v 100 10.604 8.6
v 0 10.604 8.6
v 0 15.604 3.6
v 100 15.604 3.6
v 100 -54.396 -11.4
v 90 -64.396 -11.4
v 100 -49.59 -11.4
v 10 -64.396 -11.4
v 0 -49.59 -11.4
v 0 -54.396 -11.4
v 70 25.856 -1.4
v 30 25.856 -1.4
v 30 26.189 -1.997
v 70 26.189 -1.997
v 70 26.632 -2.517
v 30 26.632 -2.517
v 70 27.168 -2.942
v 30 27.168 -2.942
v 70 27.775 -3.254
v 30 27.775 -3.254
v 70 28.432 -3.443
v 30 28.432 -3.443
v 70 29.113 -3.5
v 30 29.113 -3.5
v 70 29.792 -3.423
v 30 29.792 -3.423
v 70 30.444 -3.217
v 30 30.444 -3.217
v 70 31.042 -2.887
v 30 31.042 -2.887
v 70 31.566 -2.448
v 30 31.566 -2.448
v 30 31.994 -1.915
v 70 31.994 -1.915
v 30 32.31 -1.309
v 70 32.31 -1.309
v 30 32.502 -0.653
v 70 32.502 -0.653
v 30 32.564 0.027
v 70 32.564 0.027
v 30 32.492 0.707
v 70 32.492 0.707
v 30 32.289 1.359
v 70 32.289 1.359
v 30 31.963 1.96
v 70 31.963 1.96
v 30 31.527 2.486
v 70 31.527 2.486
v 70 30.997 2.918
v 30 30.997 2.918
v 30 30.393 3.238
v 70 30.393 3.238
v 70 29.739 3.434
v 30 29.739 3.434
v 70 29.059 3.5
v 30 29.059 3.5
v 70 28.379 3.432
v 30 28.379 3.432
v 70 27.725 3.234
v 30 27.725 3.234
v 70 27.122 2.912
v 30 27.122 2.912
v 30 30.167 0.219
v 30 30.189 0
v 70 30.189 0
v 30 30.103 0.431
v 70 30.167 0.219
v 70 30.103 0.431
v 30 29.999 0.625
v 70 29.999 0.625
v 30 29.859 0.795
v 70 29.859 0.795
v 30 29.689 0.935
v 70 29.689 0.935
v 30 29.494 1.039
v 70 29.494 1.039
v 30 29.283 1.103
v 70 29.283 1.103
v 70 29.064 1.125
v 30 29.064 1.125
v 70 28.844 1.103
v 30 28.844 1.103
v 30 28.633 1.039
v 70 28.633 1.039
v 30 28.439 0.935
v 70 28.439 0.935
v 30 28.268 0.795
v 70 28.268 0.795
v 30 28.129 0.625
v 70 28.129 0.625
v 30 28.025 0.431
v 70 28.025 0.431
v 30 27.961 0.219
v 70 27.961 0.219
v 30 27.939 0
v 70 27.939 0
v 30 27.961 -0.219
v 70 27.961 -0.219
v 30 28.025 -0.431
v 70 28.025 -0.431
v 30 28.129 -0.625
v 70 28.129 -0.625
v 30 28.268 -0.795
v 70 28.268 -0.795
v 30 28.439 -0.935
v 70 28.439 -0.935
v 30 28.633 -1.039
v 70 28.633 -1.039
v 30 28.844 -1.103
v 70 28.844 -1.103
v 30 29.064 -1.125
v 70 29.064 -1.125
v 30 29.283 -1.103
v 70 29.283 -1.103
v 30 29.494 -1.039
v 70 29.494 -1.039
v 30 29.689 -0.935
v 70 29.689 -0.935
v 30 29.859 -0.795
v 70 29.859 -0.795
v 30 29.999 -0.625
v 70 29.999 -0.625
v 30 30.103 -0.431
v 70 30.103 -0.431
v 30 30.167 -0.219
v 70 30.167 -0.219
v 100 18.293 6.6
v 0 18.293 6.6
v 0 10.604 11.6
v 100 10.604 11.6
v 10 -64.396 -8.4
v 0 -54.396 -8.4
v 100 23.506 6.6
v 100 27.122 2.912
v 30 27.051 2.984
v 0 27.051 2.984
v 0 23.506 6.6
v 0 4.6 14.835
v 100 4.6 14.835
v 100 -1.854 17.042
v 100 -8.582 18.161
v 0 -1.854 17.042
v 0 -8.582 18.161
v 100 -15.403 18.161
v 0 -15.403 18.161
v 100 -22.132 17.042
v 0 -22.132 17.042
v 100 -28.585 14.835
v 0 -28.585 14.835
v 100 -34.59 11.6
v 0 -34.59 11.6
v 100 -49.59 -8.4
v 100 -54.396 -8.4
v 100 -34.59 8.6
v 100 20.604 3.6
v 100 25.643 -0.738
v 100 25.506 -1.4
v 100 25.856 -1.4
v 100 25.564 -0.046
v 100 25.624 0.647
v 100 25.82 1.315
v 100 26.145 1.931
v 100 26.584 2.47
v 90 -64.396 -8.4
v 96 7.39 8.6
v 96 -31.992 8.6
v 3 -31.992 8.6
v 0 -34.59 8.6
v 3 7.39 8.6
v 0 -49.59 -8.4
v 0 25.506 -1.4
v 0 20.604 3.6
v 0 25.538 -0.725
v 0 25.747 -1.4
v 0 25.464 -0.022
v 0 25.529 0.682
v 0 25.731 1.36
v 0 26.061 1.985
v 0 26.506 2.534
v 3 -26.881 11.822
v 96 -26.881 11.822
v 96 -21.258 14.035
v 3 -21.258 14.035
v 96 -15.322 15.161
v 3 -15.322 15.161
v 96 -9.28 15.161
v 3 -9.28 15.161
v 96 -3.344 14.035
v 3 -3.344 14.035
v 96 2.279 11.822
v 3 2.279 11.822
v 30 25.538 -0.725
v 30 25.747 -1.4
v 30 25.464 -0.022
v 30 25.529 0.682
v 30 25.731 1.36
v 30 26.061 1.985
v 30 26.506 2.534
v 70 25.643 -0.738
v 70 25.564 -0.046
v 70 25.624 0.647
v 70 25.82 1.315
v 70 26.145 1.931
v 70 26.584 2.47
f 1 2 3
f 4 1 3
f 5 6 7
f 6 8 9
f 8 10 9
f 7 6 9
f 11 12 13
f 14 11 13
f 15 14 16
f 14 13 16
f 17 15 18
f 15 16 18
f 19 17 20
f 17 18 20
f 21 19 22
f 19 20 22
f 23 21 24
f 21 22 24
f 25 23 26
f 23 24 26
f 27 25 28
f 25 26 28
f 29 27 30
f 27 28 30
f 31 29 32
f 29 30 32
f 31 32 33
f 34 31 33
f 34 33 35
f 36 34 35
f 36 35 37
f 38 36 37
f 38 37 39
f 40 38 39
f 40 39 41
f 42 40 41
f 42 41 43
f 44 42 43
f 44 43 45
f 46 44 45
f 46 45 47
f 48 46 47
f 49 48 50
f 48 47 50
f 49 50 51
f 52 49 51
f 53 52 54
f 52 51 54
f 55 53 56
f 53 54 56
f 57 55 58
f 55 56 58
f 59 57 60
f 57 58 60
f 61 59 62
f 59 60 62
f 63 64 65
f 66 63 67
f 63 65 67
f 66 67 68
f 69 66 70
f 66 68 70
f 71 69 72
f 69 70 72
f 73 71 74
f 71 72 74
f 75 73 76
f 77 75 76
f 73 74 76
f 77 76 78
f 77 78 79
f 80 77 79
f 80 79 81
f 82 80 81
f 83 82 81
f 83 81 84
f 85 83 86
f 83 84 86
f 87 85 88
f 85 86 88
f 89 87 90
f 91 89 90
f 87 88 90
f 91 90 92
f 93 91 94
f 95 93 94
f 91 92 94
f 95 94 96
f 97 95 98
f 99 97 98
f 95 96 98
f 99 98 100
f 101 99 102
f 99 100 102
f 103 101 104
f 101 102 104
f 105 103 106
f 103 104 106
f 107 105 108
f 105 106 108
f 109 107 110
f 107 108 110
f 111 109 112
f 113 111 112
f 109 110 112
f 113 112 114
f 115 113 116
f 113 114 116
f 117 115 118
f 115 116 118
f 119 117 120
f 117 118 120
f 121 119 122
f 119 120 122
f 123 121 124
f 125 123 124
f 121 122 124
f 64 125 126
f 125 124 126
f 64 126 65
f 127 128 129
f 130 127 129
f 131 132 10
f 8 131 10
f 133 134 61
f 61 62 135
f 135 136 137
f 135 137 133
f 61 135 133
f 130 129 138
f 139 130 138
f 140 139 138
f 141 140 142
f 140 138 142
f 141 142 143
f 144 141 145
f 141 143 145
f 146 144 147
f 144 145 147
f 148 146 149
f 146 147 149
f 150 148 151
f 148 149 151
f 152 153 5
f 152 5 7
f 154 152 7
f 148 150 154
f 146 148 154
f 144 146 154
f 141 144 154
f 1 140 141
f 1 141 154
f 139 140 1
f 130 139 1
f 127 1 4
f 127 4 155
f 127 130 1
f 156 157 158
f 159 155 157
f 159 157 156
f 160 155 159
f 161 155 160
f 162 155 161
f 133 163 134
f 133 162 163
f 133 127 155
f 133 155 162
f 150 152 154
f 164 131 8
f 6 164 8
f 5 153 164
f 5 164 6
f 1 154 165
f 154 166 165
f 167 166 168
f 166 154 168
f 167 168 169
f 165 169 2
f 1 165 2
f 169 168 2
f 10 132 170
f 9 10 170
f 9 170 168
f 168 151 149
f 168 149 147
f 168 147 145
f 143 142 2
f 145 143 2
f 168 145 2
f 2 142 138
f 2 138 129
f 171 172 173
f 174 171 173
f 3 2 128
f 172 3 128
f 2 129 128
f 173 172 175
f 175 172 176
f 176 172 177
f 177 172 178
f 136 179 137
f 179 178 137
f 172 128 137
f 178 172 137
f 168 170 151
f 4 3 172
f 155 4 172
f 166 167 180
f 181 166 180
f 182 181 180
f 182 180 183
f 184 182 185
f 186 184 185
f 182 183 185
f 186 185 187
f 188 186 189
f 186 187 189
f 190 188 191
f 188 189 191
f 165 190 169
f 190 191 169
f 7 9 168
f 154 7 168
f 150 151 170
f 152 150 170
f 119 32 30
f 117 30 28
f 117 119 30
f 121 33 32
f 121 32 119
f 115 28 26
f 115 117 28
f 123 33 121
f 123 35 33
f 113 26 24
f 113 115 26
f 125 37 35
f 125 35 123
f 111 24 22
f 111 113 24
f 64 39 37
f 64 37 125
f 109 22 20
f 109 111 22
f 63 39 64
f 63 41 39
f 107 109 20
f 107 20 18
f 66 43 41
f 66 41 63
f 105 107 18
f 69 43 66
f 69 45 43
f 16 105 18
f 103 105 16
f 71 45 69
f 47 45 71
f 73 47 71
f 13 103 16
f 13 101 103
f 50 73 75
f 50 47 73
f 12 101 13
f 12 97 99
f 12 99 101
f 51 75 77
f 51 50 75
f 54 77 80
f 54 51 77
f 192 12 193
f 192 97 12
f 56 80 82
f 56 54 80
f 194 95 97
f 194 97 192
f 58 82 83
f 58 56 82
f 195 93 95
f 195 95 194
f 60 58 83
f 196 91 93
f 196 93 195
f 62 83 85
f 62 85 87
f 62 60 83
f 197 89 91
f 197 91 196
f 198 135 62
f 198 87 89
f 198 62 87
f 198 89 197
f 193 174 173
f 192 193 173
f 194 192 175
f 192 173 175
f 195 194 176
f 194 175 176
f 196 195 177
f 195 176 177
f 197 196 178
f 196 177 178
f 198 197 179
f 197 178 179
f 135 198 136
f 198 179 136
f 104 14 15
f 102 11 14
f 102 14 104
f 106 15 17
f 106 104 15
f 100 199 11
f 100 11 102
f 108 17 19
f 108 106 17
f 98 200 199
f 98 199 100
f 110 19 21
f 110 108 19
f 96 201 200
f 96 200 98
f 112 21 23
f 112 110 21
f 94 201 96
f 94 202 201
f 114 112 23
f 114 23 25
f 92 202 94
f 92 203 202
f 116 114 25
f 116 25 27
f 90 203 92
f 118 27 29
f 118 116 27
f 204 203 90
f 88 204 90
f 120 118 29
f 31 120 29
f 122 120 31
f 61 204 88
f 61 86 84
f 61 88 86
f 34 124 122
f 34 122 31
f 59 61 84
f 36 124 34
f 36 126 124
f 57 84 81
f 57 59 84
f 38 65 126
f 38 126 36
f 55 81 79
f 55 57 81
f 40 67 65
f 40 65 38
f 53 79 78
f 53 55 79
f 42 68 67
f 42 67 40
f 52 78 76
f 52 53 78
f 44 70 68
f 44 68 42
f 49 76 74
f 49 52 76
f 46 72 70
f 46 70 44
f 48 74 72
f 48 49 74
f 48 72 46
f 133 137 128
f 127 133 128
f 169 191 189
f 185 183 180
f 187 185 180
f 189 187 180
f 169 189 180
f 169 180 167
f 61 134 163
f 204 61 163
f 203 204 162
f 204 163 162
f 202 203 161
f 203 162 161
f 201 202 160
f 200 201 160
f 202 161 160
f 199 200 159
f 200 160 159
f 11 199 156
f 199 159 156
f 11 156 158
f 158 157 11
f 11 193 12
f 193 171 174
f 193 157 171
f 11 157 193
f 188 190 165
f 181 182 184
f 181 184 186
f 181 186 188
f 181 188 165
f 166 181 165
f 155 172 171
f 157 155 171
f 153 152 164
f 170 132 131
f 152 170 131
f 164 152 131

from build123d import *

# Parameters (mm, degrees)
F1_DEPTH  = 100
F2_SIZE   = 10
F3_R      = 3.5
F4_DEPTH  = 30
F5_R      = 3.6
F6_DEPTH  = 30
F7_R      = 1.125
F8_DEPTH  = 40
F11_DEPTH = 93


# Not quite as in the source:
# - a feature names something its author has since deleted; it is built from what else it names


with BuildPart() as f1:
    # F0 (on Right) → F1 (new body)
    with BuildSketch(Plane.YZ):
        with BuildLine():
            Line((25.5061486276, -1.4), (25.8561486276, -1.4))
            ThreePointArc((25.8561486276, -1.4), (32.4222243139, -0.9859028724), (27.1219938253, 2.9118378984))
            Line((27.1219938253, 2.9118378984), (23.5061486276, 6.6))
            Line((23.5061486276, 6.6), (18.2925903906, 6.6))
            Line((18.2925903906, 6.6), (10.6041878433, 11.6))
            Line((10.6041878433, 11.6), (-34.5898121567, 11.6))
            Line((-34.5898121567, 11.6), (-49.5898121567, -8.4))
            Line((-49.5898121567, -8.4), (-64.3958121567, -8.4))
            Line((-64.3958121567, -8.4), (-64.3958121567, -11.4))
            Line((-64.3958121567, -11.4), (-49.5898121567, -11.4))
            Line((-49.5898121567, -11.4), (-34.5898121567, 8.6))
            Line((-34.5898121567, 8.6), (10.6041878433, 8.6))
            Line((10.6041878433, 8.6), (15.6041878433, 3.6))
            Line((15.6041878433, 3.6), (20.6041878433, 3.6))
            Line((20.6041878433, 3.6), (25.5061486276, -1.4))
        make_face()
        with BuildLine():
            Line((-34.5898121567, 11.6), (10.6041878433, 11.6))
            ThreePointArc((10.6041878433, 11.6), (-11.9928121567, 18.3015086266), (-34.5898121567, 11.6))
        make_face()
    extrude(amount=F1_DEPTH)

    # F2
    f2_edges = [f1.edges().sort_by_distance(p)[0] for p in [
        (100, -64.395812, -9.9),
        (0, -64.395812, -9.9),
    ]]
    chamfer(f2_edges, length=F2_SIZE)

    # F3 (on face) → F4 (cut)
    with BuildSketch(Plane.YZ.offset(100)):
        with Locations((29.0639516141, 0)):
            Circle(F3_R)
    extrude(amount=-F4_DEPTH, mode=Mode.SUBTRACT)

    # F5 (on face) → F6 (cut)
    with BuildSketch(Plane(origin=(0, 0, 0), x_dir=(0, -1, 0), z_dir=(-1, 0, 0))):
        with Locations((-29.0639516141, 0)):
            Circle(F5_R)
    extrude(amount=-F6_DEPTH, mode=Mode.SUBTRACT)

    # F7 (on face) → F8 (cut, through all)
    with BuildSketch(Plane.YZ.offset(70)):
        with Locations((29.0639516141, 0)):
            Circle(F7_R)
    extrude(amount=-F8_DEPTH, mode=Mode.SUBTRACT)

    # F10 (on offset) → F11 (cut)
    with BuildSketch(Plane(origin=(3, 0, 0), x_dir=(0, -1, 0), z_dir=(-1, 0, 0))):
        with BuildLine():
            Line((-7.3898630986, 8.6), (31.992161455, 8.6))
            ThreePointArc((31.992161455, 8.6), (12.3011491782, 15.3028562463), (-7.3898630986, 8.6))
        make_face()
    extrude(amount=-F11_DEPTH, mode=Mode.SUBTRACT)


solid = f1.part
